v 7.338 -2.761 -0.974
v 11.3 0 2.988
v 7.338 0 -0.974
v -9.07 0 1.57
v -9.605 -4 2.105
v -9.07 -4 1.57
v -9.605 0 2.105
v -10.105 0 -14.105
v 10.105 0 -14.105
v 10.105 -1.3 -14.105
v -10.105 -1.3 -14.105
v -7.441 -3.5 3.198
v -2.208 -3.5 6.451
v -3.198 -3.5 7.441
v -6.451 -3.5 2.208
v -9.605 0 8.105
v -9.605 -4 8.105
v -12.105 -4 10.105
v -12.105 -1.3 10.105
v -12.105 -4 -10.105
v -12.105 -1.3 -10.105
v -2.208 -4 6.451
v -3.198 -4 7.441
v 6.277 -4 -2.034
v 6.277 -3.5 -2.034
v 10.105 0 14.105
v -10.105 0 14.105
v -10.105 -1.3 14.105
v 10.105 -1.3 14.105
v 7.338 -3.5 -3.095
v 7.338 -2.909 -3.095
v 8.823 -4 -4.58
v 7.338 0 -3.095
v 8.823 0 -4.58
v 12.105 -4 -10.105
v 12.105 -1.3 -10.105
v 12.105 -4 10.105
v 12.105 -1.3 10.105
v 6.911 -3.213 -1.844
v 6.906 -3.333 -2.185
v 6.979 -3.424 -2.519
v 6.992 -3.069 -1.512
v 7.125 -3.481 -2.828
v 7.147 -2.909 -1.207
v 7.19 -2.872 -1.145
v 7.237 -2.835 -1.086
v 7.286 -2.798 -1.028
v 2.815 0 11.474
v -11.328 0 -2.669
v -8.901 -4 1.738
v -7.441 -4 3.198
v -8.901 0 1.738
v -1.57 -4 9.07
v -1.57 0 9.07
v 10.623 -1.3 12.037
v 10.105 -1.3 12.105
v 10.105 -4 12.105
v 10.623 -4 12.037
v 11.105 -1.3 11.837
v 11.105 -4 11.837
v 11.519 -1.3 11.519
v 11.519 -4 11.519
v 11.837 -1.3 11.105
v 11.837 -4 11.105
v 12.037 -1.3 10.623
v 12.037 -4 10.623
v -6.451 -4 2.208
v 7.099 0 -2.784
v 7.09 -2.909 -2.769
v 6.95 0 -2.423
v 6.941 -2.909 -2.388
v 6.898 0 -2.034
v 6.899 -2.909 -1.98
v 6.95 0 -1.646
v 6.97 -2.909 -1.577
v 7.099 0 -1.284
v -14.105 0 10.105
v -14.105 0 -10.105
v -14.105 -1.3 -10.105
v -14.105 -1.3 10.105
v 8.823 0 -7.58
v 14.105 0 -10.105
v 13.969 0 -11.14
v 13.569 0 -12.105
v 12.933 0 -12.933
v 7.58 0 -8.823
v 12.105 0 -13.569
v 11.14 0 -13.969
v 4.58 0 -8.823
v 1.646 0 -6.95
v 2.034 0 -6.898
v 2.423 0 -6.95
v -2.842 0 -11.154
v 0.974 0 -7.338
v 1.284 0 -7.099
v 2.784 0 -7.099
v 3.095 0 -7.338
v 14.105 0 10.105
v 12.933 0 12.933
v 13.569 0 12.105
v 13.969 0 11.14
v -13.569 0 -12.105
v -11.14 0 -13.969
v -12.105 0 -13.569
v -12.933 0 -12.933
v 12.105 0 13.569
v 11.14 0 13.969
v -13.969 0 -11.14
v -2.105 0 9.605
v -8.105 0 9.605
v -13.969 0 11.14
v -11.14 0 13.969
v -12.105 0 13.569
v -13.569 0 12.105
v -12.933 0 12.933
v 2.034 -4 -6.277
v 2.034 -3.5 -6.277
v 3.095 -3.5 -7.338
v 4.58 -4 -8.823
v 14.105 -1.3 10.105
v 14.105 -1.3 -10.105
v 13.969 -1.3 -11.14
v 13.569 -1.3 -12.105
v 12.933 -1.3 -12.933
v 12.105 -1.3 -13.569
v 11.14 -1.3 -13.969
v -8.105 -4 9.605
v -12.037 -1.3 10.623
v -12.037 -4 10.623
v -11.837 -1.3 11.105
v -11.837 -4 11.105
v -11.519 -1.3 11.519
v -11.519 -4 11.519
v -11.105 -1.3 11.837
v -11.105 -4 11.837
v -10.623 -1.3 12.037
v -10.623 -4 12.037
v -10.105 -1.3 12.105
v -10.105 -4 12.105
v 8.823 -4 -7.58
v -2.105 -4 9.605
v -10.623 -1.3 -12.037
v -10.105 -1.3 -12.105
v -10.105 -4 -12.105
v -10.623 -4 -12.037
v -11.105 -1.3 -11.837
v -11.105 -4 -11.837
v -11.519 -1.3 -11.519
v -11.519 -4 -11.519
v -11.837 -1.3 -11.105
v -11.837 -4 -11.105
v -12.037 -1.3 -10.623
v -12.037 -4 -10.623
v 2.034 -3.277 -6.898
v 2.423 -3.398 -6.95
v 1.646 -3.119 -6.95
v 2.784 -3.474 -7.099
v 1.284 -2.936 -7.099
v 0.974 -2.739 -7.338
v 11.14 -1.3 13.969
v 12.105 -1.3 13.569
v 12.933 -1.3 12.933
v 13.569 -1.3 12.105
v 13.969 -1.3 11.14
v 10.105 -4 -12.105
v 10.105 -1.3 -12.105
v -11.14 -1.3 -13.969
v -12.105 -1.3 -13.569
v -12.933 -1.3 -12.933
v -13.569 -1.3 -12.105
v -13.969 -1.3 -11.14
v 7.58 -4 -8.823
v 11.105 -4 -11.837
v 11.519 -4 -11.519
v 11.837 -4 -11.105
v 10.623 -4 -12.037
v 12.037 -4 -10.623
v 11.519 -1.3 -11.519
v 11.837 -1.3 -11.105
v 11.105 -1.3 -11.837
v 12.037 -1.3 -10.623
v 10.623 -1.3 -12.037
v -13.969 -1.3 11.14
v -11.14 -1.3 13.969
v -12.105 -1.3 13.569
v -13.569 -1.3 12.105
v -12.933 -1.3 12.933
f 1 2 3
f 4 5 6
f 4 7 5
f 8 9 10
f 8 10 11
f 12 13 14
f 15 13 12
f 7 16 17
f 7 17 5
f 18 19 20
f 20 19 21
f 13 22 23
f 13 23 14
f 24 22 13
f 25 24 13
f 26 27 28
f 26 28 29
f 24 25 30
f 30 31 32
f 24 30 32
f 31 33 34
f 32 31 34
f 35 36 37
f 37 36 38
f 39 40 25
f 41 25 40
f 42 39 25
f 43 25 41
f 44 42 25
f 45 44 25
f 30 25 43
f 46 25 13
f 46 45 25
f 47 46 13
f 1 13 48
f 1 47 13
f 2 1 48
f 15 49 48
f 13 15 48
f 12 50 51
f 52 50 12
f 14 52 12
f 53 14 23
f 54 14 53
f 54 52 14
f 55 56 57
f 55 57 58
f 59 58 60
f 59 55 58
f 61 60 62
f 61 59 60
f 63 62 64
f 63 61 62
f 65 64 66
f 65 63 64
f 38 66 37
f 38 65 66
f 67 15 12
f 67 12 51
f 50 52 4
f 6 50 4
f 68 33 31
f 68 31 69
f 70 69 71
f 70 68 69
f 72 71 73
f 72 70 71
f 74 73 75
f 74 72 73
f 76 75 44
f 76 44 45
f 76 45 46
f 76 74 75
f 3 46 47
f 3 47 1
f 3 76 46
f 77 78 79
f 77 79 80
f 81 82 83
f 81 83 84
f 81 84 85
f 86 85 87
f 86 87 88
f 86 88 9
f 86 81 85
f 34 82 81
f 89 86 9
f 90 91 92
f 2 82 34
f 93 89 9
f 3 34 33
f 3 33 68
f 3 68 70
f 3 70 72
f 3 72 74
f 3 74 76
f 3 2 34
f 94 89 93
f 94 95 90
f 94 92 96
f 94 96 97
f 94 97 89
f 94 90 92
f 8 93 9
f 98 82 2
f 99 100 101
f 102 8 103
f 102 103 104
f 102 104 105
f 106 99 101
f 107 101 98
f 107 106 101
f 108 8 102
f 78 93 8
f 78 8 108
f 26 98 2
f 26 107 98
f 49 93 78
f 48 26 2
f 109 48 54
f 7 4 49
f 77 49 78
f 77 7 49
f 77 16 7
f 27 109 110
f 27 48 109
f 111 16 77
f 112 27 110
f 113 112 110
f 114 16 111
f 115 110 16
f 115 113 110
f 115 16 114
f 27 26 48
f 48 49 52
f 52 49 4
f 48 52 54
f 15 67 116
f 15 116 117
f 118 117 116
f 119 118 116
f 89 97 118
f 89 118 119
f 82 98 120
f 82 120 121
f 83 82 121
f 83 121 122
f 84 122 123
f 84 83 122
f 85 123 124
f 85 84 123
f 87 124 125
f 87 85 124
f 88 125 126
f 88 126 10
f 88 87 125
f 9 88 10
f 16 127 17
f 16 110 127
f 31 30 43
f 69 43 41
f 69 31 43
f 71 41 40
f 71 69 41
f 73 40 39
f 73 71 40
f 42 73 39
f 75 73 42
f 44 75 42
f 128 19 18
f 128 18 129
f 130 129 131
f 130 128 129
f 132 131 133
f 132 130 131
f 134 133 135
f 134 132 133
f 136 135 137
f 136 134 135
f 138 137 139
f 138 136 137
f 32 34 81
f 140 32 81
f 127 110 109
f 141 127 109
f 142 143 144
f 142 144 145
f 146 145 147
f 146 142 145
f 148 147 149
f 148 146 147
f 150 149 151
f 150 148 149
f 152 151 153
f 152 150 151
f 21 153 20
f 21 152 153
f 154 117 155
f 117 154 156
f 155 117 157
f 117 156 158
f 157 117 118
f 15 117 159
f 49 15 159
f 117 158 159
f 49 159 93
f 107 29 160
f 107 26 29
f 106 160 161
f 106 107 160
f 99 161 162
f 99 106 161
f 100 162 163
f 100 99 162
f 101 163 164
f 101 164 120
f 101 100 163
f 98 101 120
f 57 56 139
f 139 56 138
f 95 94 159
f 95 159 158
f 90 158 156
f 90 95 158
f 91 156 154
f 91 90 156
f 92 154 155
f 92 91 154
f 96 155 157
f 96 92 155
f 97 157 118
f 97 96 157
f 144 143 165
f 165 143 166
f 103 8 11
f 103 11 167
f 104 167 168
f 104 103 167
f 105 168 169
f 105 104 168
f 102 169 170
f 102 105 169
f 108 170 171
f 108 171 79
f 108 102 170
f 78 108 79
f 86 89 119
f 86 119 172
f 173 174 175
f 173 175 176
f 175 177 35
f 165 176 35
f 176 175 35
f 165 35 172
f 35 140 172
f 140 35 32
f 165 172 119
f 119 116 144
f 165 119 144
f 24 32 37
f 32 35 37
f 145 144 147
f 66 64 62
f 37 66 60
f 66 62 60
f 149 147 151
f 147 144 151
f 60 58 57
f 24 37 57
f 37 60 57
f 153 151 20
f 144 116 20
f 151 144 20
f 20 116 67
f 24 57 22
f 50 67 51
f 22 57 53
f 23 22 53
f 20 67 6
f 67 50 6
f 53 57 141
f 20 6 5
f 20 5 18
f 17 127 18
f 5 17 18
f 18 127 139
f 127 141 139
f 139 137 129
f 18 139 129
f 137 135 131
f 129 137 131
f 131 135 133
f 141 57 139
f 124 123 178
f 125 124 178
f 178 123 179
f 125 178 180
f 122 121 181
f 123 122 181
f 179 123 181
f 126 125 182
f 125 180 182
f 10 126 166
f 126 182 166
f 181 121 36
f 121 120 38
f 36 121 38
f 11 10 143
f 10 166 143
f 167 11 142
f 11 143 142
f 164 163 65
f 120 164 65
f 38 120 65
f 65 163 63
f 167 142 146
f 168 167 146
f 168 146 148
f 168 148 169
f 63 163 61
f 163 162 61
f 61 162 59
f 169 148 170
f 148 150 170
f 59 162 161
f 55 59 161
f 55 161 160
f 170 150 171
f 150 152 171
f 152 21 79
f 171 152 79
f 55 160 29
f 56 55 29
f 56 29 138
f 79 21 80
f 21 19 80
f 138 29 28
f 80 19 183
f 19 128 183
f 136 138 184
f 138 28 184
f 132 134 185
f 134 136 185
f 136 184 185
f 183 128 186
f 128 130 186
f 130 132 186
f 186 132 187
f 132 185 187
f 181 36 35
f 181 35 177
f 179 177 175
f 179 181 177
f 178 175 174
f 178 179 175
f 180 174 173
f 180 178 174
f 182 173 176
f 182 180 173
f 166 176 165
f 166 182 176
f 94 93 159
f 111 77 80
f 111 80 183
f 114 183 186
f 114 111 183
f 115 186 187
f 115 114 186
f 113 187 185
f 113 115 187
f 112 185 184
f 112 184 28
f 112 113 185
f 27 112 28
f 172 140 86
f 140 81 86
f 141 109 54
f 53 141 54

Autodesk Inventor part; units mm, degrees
ref_plane "YZ Plane" through (0, 0, 0) normal (1, 0, 0) x (0, 1, 0)
ref_plane "XZ Plane" through (0, 0, 0) normal (0, 1, 0) x (-1, 0, 0)
ref_plane "XY Plane" through (0, 0, 0) normal (0, 0, 1) x (1, 0, 0)
sketch "Sketch1" plane through (0, 0, 0) normal (0, 1, 0) x (-1, 0, 0)
  line L0 (-10.105, -14.105) -> (10.105, -14.105)
  line L1 (14.105, -10.105) -> (14.105, 10.105)
  line L2 (10.105, 14.105) -> (-10.105, 14.105)
  line L3 (-14.105, 10.105) -> (-14.105, -10.105)
  line L4 (-14.105, -14.105) -> (14.105, 14.105) construction
  line L5 (14.105, -14.105) -> (-14.105, 14.105) construction
  arc A0 (14.105, 10.105) -> (10.105, 14.105) centre (10.105, 10.105) ccw
  arc A1 (-10.105, 14.105) -> (-14.105, 10.105) centre (-10.105, 10.105) ccw
  arc A2 (-14.105, -10.105) -> (-10.105, -14.105) centre (-10.105, -10.105) ccw
  arc A3 (10.105, -14.105) -> (14.105, -10.105) centre (10.105, -10.105) ccw
  line L6 (10.105, 14.105) -> (10.105, 8.105) construction
  line L7 (9.605, 8.105) -> (9.605, 2.105)
  line L8 (8.105, 9.605) -> (2.105, 9.605)
  line L9 (8.105, 9.605) -> (9.605, 8.105)
  line L10 (8.9013, 1.7376) -> (1.5695, 9.0695)
  line L11 (2.105, 9.605) -> (1.5695, 9.0695)
  line L12 (8.9013, 1.7376) -> (9.0695, 1.5695)
  line L13 (9.605, 2.105) -> (9.0695, 1.5695)
  line L14 (8.0814, 0.5776) -> (0.5776, 8.0814)
  line L15 (2.2082, 6.4508) -> (-8.8227, -4.58)
  line L16 (6.4508, 2.2082) -> (-4.58, -8.8227)
  line L17 (-4.58, -8.8227) -> (-7.58, -8.8227)
  line L18 (-8.8227, -4.58) -> (-8.8227, -7.58)
  line L19 (-8.8227, -7.58) -> (-7.58, -8.8227)
  line L20 (-10.105, 12.105) -> (10.105, 12.105)
  arc A4 (12.105, 10.105) -> (10.105, 12.105) centre (10.105, 10.105) ccw
  line L21 (12.105, 10.105) -> (12.105, -10.105)
  arc A5 (10.105, -12.105) -> (12.105, -10.105) centre (10.105, -10.105) ccw
  line L22 (10.105, -12.105) -> (-10.105, -12.105)
  arc A6 (-12.105, -10.105) -> (-10.105, -12.105) centre (-10.105, -10.105) ccw
  line L23 (-12.105, -10.105) -> (-12.105, 10.105)
  arc A7 (-10.105, 12.105) -> (-12.105, 10.105) centre (-10.105, 10.105) ccw
  point P0 (0, 0)
  point P1 (8.855, 8.855)
  point P2 (4.3295, 4.3295)
  dimension "d0" = 28.21
  dimension "d1" = 28.21
  dimension "d2" = 4
  dimension "d13" = 6
  dimension "d16" = 6
  dimension "d18" = 5
  dimension "d21" = 1.4
  dimension "d22" = 15.6
  dimension "d24" = 3
  dimension "d25" = 3
  dimension "d28" = 2
extrude "Extrusion5" add sketch "Sketch1" against normal blind 1.3 contours A2 L3 A1 L2 A0 L1 A3 L0
extrude "Extrusion6" add sketch "Sketch1" against normal blind 4 contours L20 A4 L21 A5 L22 A6 L23 A7
sketch "Sketch5" plane through (-2.2082, -4, 6.4508) normal (0.7071068, 0, -0.7071068) x (-0.7071068, 0, -0.7071068)
  line L0 (6, 0) -> (0, 0) projected
  line L1 (6, 0) -> (0, 0)
  line L2 (0, 0) -> (0, 0.5)
  line L3 (0, 0.5) -> (6, 0.5)
  line L4 (6, 0.5) -> (6, 0)
  point P0 (3, 4)
  dimension "d33" = 6
  dimension "d34" = 0.5
extrude "Extrusion7" cut sketch "Sketch5" against normal blind 4
sketch "Sketch6" plane through (0, 0, 0) normal (0, 1, 0) x (1, 0, 0)
  line L0 (-14.105, -14.105) -> (14.105, 14.105) construction
  line L1 (-14.105, 14.105) -> (14.105, -14.105) construction
  line L2 (-9.0695, -1.5695) -> (-1.5695, -9.0695) projected
  line L3 (2.8146, -11.4736) -> (11.2999, -2.9883)
  line L4 (1.1859, 7.1256) -> (-2.8423, 11.1538)
  line L5 (-2.8423, 11.1538) -> (-11.3275, 2.6685)
  line L6 (4.58, 8.8227) -> (7.58, 8.8227) projected
  line L7 (-6.4508, -2.2082) -> (4.58, 8.8227) projected
  line L8 (11.2999, -2.9883) -> (7.1256, 1.1859)
  line L9 (-2.2082, -6.4508) -> (-6.4508, -2.2082) projected
  line L10 (-2.2082, -6.4508) -> (2.8146, -11.4736)
  line L11 (-6.4508, -2.2082) -> (-11.3275, 2.6685)
  line L12 (8.8227, 4.58) -> (-2.2082, -6.4508) projected
  line L13 (7.1256, 1.1859) -> (6.9842, 1.3273)
  line L14 (1.1859, 7.1256) -> (1.3273, 6.9842)
  line L15 (6.2771, 2.0344) -> (-2.2082, -6.4508)
  line L16 (2.0344, 6.2771) -> (-6.4508, -2.2082)
  line L17 (6.9842, 1.3273) -> (6.2771, 2.0344)
  line L18 (1.3273, 6.9842) -> (2.0344, 6.2771)
  point P0 (0, 0)
  dimension "d39" = 20
  dimension "d53" = 12
extrude "Extrusion8" cut sketch "Sketch6" against normal through all
sketch "Sketch8" plane through (11.2999, -4, 2.9883) normal (-0.7071068, 0, 0.7071068) x (0.7071068, 0, 0.7071068)
  line L0 (0, 0) -> (-7.1033, 0) projected
  line L1 (0, 4) -> (0, 0) projected
  line L2 (0, 4) -> (0, 0)
  line L3 (0, 0) -> (-7.1033, 0)
  line L4 (-20, 4) -> (-20, 0) projected
  line L5 (-20, 4) -> (-20, 0)
  line L6 (-13.1033, 0) -> (-20, 0) projected
  line L7 (-13.0928, 0) -> (-20, 0)
  line L8 (-13.1033, 0) -> (-13.1033, 0.5)
  line L9 (-13.1033, 4) -> (-13.1033, 0) projected
  line L10 (-13.1033, 0.5) -> (-20, 4)
  line L11 (-7.1033, 0) -> (-7.1033, 0.5)
  line L12 (-7.1033, 0.5) -> (0, 4)
  point P0 (-10.1033, 4)
  point P1 (-13.1033, 0)
  dimension "d48" = 0.5
  dimension "d49" = 0.5
extrude "Extrusion10" add sketch "Sketch8" along normal blind 12
fillet "Fillet2" radius 1.5 2 edges at (2.0344, -1.75, -6.2771) (6.2771, -1.75, -2.0344)
properties part number "pieza_edu_fisica"
